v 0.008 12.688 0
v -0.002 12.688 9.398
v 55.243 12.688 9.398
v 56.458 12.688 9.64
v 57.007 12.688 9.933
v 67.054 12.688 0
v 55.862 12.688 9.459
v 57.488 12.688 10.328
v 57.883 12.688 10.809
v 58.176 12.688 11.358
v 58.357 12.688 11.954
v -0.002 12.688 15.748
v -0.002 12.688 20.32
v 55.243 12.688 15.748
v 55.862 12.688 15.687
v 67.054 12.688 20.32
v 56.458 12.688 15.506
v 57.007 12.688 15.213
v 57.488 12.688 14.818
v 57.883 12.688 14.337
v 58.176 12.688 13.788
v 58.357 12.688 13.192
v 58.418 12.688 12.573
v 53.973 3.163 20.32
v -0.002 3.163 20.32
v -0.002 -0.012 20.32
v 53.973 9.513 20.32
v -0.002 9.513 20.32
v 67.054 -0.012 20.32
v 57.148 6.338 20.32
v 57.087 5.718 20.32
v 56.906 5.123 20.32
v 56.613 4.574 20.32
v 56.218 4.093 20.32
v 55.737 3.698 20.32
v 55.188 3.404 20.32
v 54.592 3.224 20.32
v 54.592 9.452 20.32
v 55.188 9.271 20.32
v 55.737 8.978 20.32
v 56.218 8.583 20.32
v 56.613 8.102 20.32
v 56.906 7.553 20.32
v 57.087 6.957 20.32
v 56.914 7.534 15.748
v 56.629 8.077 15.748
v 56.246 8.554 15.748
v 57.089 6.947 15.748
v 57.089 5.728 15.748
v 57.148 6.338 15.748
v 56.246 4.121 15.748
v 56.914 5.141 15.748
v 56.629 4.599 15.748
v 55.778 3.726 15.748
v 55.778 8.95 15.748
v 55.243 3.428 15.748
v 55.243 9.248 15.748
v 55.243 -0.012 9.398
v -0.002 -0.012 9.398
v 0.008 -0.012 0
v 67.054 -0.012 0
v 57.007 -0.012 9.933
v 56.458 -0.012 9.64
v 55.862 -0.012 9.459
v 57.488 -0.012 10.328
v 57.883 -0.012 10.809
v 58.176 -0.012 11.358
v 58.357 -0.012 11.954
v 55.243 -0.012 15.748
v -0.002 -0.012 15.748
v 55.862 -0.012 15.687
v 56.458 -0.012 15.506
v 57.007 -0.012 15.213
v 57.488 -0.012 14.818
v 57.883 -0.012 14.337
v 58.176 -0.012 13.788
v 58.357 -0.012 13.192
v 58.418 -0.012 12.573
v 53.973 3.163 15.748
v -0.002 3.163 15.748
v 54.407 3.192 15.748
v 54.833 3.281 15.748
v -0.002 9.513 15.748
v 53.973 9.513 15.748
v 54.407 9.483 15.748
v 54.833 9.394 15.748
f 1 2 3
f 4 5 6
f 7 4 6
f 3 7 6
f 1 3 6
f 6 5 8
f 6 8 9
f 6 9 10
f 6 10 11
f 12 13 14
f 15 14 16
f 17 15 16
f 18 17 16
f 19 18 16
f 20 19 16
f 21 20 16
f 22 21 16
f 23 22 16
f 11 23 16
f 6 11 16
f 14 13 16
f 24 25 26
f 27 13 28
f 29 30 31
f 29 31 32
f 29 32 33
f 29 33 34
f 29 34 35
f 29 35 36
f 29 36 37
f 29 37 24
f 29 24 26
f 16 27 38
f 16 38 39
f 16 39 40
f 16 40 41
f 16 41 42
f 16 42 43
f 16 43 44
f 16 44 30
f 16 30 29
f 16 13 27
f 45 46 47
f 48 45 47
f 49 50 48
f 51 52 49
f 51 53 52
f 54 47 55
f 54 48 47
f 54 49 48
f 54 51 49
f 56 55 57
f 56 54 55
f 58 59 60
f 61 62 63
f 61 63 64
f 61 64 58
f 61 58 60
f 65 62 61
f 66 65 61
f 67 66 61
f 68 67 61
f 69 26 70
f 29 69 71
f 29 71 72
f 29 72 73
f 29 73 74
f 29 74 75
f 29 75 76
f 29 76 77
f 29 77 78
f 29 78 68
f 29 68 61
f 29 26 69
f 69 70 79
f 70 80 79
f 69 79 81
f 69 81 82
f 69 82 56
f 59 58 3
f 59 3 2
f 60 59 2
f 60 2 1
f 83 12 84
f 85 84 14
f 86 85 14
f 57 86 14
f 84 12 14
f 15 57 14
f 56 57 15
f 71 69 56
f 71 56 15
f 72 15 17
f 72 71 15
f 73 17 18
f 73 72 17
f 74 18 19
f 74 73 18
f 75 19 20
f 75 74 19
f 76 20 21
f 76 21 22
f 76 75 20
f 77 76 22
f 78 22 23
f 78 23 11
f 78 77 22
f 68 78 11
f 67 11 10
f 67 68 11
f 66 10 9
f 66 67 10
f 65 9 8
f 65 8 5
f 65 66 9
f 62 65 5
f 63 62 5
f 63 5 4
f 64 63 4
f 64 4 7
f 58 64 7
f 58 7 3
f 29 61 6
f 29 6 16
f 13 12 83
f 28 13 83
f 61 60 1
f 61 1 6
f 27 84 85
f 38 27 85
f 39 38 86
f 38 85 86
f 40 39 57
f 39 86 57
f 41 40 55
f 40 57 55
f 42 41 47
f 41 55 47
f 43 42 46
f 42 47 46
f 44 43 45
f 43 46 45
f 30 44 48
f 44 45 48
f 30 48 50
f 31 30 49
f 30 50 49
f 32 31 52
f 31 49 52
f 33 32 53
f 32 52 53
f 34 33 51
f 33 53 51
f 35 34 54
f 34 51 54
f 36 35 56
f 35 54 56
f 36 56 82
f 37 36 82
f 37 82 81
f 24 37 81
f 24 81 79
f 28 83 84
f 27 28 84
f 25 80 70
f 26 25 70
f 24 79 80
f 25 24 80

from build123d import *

# Parameters (mm, degrees)
F1_DEPTH = 4.572
F3_DEPTH = 12.7


with BuildPart() as f1:
    # F0 (on Top) → F1 (new body)
    with BuildSketch(Plane.XY):
        with BuildLine():
            Line((24.051455, 5.270794), (-43.004545, 5.270794))
            Line((-43.004545, 5.270794), (-43.004545, 2.095794))
            Line((-43.004545, 2.095794), (10.970455, 2.095794))
            ThreePointArc((10.970455, 2.095794), (14.145455, -1.079206), (10.970455, -4.254206))
            Line((10.970455, -4.254206), (-43.004545, -4.254206))
            Line((-43.004545, -4.254206), (-43.004545, -7.429206))
            Line((-43.004545, -7.429206), (24.051455, -7.429206))
            Line((24.051455, -7.429206), (24.051455, 5.270794))
        make_face()
    extrude(amount=F1_DEPTH)

    # F2 (on face) → F3 (join)
    with BuildSketch(Plane.XZ.offset(7.429206)):
        with BuildLine():
            Line((24.051455, 0), (12.240455, 0))
            ThreePointArc((12.240455, 0), (15.415455, -3.175), (12.240455, -6.35))
            Line((12.240455, -6.35), (-43.004545, -6.35))
            Line((-43.004545, -6.35), (-42.99381, -15.748))
            Line((-42.99381, -15.748), (24.051455, -15.748))
            Line((24.051455, -15.748), (24.051455, 0))
        make_face()
    extrude(amount=-F3_DEPTH)


with BuildPart() as f1_1:
    # F4: moved
    add(f1.part.moved(Location((43.0022, 7.4168, 15.748))))


solid = f1_1.part
